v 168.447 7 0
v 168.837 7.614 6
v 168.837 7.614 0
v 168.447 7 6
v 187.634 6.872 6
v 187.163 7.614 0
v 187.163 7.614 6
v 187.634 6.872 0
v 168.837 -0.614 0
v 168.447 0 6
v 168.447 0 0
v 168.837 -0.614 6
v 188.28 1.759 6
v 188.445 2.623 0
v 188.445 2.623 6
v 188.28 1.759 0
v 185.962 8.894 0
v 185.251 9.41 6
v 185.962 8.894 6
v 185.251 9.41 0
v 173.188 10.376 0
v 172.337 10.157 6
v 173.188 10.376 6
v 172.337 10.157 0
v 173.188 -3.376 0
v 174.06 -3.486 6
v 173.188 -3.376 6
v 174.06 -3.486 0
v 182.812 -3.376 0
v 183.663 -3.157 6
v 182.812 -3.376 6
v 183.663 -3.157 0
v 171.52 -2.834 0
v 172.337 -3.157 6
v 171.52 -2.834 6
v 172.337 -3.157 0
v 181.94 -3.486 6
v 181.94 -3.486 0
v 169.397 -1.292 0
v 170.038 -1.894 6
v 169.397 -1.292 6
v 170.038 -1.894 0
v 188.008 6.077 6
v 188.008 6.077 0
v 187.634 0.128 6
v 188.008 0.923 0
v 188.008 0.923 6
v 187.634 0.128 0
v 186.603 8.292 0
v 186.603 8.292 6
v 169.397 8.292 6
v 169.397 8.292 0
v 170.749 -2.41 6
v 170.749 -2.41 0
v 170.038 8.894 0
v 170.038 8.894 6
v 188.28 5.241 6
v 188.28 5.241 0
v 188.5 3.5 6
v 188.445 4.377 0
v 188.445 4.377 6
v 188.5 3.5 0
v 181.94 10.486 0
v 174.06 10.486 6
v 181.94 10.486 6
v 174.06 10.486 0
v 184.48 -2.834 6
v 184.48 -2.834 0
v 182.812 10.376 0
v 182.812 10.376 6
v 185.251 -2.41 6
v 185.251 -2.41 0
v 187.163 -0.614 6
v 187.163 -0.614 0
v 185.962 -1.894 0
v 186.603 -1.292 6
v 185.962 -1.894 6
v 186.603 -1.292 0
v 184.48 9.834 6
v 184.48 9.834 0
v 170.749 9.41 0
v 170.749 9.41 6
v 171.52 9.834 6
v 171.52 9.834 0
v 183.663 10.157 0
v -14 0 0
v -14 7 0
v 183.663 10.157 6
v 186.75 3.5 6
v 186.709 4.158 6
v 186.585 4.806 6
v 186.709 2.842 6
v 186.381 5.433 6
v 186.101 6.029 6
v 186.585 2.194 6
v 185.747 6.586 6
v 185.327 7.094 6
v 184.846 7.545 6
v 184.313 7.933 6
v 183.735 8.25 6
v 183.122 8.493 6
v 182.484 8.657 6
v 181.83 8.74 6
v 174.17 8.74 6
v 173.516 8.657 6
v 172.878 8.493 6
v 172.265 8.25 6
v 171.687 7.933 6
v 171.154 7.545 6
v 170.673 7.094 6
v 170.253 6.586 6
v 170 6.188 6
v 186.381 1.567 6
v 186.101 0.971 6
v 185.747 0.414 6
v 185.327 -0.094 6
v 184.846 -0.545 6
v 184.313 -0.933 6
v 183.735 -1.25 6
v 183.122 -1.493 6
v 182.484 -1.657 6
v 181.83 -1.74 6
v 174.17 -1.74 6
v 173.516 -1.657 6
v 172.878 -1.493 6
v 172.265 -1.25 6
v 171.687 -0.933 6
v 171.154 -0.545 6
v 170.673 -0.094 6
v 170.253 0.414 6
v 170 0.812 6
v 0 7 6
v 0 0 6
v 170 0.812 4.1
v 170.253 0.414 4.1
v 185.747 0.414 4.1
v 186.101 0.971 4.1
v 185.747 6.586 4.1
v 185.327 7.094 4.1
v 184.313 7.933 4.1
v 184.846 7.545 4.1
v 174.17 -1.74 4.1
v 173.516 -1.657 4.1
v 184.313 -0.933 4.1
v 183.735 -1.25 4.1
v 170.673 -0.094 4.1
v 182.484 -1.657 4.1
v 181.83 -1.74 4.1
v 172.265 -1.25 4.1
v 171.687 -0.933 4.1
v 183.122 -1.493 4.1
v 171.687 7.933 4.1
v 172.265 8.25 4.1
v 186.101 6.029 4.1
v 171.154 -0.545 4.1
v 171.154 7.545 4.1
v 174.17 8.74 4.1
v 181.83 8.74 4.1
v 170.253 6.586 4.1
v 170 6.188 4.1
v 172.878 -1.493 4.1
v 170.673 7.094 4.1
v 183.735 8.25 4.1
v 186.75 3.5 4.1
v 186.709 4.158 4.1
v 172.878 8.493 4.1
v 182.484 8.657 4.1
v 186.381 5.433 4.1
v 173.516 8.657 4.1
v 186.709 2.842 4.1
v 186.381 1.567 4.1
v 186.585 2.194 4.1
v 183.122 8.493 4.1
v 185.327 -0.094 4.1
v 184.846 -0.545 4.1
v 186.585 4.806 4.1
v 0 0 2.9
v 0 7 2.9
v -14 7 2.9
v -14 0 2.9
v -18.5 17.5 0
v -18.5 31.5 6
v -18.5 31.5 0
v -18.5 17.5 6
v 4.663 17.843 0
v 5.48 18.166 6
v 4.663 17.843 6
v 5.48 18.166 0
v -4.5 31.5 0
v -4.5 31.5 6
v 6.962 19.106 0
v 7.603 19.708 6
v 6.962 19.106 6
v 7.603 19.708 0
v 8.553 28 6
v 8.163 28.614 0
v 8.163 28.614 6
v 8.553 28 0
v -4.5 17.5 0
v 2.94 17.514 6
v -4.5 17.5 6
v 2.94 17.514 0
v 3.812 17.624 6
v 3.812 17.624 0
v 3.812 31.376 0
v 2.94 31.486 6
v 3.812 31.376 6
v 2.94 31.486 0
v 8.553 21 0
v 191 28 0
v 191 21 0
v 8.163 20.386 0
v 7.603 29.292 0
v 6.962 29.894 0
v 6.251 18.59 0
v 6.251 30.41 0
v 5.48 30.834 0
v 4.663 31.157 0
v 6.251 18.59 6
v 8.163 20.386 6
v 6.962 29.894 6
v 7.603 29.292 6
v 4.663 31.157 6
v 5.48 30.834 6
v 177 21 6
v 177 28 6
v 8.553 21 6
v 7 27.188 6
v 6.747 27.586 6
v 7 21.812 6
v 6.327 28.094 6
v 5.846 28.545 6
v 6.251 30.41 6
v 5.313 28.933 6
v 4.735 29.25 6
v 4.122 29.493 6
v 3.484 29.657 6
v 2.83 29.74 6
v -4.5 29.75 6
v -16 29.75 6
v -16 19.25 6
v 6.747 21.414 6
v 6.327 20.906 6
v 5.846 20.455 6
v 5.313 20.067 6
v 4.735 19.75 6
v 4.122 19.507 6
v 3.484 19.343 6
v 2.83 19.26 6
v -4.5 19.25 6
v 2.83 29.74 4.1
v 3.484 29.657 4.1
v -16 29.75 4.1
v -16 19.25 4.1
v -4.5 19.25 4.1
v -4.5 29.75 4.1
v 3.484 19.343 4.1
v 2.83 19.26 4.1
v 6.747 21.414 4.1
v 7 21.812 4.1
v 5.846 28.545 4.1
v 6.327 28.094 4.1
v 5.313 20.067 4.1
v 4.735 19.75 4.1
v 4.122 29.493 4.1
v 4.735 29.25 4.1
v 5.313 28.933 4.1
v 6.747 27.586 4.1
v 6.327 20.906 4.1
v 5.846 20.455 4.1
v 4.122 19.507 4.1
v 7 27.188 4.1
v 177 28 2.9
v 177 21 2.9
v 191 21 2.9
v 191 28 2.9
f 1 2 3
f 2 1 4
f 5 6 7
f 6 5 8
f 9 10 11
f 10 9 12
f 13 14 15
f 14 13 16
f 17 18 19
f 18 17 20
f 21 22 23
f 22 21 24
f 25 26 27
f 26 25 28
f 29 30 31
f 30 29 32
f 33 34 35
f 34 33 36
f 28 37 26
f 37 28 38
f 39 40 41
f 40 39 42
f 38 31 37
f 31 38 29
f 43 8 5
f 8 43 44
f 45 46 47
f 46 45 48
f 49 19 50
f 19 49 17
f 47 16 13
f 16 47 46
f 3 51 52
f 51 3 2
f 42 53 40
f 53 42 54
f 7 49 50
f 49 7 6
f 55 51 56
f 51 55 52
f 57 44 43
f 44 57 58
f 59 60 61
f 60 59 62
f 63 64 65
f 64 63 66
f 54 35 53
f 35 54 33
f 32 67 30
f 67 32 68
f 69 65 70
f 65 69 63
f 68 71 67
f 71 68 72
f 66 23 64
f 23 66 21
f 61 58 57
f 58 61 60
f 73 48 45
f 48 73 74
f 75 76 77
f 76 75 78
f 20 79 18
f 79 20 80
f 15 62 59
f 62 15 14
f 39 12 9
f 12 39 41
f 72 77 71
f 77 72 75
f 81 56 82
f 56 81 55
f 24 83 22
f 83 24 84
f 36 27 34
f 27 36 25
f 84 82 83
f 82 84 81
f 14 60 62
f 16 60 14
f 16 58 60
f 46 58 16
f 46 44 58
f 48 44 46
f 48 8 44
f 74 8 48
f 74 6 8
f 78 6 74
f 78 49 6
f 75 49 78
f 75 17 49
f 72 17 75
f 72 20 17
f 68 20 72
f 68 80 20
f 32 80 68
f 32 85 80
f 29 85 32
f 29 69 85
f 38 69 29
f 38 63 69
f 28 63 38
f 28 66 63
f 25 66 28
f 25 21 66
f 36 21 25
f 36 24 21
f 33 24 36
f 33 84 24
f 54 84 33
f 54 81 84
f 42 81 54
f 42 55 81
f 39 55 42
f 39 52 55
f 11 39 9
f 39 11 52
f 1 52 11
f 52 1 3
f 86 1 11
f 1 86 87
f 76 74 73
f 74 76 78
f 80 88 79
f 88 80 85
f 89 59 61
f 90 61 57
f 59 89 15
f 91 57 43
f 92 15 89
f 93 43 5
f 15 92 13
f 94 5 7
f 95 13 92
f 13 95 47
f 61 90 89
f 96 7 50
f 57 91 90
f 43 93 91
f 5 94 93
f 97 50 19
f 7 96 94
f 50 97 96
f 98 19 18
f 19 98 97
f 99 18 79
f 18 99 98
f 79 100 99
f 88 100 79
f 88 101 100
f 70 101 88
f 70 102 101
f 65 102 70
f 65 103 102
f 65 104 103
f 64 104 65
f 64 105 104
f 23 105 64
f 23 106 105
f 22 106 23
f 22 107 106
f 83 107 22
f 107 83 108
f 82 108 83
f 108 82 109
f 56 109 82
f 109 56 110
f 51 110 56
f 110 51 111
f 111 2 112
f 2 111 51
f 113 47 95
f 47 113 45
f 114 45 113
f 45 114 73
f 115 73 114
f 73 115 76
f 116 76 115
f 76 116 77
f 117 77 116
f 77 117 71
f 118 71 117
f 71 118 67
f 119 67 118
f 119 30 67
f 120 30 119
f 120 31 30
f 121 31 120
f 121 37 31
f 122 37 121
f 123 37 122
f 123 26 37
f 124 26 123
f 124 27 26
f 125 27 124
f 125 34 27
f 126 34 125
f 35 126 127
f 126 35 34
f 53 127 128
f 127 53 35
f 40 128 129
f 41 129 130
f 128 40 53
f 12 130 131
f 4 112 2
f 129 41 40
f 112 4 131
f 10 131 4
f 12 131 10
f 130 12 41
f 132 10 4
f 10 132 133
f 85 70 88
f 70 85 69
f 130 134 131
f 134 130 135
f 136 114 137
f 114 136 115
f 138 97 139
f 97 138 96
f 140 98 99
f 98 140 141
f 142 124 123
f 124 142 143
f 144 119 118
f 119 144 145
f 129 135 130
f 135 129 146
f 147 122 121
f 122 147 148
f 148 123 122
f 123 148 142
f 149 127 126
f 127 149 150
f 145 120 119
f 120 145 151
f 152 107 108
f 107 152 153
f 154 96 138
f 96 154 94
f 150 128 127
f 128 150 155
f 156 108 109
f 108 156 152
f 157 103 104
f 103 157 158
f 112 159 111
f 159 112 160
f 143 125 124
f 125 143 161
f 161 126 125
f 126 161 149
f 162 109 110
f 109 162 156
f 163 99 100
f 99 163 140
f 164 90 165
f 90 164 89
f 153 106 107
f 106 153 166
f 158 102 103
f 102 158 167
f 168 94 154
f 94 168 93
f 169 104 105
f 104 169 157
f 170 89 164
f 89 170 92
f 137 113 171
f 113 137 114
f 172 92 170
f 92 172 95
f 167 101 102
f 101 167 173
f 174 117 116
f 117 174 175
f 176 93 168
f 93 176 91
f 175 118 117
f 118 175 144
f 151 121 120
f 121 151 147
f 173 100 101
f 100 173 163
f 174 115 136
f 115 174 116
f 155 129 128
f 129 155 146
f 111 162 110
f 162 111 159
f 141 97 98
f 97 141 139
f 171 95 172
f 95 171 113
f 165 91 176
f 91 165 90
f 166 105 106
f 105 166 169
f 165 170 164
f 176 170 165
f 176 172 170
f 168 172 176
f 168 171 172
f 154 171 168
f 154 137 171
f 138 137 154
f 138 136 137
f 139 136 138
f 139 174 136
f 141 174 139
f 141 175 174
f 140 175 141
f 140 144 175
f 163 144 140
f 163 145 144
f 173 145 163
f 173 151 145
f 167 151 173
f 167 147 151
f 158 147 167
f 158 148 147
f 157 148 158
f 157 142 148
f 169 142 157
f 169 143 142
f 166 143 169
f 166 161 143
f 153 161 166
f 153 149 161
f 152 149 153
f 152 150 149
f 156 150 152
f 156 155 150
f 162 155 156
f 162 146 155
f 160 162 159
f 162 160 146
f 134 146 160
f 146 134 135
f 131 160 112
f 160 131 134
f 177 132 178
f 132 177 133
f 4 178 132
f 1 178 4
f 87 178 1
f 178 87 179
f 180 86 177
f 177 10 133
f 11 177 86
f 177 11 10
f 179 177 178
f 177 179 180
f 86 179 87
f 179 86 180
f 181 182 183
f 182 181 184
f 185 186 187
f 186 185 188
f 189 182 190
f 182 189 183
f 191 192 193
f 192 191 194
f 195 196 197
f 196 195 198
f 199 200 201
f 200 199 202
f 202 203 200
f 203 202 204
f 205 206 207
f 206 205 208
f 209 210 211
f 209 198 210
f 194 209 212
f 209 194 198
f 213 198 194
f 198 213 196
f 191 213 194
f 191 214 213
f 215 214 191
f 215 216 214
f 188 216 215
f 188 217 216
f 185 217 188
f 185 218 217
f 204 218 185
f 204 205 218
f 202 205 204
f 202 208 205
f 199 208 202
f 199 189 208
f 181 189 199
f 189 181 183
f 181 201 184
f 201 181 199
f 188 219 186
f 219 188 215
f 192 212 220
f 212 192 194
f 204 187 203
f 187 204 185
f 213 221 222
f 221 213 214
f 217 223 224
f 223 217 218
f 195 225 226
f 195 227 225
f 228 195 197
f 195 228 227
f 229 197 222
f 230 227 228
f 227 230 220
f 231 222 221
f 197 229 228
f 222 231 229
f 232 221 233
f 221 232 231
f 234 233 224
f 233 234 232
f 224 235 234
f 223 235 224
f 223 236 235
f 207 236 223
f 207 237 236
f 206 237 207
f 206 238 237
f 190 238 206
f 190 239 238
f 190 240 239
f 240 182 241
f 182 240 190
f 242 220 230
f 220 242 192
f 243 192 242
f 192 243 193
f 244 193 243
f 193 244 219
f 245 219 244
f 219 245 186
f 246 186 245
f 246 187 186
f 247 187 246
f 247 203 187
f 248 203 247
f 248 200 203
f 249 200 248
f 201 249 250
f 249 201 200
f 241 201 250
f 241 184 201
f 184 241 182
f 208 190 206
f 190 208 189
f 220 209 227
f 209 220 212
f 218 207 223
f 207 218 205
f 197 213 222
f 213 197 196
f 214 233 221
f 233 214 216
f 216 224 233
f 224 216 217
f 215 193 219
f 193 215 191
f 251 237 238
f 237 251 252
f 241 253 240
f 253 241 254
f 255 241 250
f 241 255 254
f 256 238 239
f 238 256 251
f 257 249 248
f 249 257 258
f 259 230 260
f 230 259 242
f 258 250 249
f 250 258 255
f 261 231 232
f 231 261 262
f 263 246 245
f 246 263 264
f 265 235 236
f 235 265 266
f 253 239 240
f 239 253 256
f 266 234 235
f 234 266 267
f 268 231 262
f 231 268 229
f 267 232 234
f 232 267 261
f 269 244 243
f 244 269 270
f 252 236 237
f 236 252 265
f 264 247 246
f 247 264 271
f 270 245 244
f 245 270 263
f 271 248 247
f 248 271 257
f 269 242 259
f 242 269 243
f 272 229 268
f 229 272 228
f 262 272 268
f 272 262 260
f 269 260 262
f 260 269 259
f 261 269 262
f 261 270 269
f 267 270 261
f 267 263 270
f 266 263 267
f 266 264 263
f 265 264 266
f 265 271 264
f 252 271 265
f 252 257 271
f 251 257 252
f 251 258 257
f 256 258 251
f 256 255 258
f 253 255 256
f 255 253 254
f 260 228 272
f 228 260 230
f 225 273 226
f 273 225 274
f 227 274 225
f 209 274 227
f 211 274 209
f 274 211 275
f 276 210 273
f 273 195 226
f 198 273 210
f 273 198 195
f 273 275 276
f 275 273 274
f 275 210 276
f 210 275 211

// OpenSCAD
width = 170; // [50:300]
height = 6;  // [4:20]
depth = 7;   // [4:20]
UseCubicTip = "yes"; // [yes,no]
/* HIDDEN */
$fn=50;
CubicTip= (UseCubicTip=="yes");

P1(false);
translate([width+depth,depth*4])rotate(a=[0,0,180]) P1(CubicTip);

module P1(Cubic){    
    cS1 = depth*2;
    cS2 = depth*1.5;
    cube([width,depth,height]);
    translate([-depth*2,0])cube([depth*2,depth,height/2-0.1]);
    translate([width+depth-depth/2+1,depth/2]) difference(){
        hull(){
            cylinder(d=depth*2,h=height);
            if(Cubic) {translate([depth,-cS1/2]) cube([cS1,cS1,height]);}
            else {translate([depth,0]) cylinder(d=depth*2,h=height);}
        }
        translate([0,0,height*2/3+0.1]) hull(){
            cylinder(d=depth*1.5,h=height/3);
            if(Cubic) {translate([depth,-cS2/2]) cube([cS2+1,cS2,height/3]);}
            else {translate([depth,0]) cylinder(d=depth*1.5,h=height/3);}
        }
    }
}
